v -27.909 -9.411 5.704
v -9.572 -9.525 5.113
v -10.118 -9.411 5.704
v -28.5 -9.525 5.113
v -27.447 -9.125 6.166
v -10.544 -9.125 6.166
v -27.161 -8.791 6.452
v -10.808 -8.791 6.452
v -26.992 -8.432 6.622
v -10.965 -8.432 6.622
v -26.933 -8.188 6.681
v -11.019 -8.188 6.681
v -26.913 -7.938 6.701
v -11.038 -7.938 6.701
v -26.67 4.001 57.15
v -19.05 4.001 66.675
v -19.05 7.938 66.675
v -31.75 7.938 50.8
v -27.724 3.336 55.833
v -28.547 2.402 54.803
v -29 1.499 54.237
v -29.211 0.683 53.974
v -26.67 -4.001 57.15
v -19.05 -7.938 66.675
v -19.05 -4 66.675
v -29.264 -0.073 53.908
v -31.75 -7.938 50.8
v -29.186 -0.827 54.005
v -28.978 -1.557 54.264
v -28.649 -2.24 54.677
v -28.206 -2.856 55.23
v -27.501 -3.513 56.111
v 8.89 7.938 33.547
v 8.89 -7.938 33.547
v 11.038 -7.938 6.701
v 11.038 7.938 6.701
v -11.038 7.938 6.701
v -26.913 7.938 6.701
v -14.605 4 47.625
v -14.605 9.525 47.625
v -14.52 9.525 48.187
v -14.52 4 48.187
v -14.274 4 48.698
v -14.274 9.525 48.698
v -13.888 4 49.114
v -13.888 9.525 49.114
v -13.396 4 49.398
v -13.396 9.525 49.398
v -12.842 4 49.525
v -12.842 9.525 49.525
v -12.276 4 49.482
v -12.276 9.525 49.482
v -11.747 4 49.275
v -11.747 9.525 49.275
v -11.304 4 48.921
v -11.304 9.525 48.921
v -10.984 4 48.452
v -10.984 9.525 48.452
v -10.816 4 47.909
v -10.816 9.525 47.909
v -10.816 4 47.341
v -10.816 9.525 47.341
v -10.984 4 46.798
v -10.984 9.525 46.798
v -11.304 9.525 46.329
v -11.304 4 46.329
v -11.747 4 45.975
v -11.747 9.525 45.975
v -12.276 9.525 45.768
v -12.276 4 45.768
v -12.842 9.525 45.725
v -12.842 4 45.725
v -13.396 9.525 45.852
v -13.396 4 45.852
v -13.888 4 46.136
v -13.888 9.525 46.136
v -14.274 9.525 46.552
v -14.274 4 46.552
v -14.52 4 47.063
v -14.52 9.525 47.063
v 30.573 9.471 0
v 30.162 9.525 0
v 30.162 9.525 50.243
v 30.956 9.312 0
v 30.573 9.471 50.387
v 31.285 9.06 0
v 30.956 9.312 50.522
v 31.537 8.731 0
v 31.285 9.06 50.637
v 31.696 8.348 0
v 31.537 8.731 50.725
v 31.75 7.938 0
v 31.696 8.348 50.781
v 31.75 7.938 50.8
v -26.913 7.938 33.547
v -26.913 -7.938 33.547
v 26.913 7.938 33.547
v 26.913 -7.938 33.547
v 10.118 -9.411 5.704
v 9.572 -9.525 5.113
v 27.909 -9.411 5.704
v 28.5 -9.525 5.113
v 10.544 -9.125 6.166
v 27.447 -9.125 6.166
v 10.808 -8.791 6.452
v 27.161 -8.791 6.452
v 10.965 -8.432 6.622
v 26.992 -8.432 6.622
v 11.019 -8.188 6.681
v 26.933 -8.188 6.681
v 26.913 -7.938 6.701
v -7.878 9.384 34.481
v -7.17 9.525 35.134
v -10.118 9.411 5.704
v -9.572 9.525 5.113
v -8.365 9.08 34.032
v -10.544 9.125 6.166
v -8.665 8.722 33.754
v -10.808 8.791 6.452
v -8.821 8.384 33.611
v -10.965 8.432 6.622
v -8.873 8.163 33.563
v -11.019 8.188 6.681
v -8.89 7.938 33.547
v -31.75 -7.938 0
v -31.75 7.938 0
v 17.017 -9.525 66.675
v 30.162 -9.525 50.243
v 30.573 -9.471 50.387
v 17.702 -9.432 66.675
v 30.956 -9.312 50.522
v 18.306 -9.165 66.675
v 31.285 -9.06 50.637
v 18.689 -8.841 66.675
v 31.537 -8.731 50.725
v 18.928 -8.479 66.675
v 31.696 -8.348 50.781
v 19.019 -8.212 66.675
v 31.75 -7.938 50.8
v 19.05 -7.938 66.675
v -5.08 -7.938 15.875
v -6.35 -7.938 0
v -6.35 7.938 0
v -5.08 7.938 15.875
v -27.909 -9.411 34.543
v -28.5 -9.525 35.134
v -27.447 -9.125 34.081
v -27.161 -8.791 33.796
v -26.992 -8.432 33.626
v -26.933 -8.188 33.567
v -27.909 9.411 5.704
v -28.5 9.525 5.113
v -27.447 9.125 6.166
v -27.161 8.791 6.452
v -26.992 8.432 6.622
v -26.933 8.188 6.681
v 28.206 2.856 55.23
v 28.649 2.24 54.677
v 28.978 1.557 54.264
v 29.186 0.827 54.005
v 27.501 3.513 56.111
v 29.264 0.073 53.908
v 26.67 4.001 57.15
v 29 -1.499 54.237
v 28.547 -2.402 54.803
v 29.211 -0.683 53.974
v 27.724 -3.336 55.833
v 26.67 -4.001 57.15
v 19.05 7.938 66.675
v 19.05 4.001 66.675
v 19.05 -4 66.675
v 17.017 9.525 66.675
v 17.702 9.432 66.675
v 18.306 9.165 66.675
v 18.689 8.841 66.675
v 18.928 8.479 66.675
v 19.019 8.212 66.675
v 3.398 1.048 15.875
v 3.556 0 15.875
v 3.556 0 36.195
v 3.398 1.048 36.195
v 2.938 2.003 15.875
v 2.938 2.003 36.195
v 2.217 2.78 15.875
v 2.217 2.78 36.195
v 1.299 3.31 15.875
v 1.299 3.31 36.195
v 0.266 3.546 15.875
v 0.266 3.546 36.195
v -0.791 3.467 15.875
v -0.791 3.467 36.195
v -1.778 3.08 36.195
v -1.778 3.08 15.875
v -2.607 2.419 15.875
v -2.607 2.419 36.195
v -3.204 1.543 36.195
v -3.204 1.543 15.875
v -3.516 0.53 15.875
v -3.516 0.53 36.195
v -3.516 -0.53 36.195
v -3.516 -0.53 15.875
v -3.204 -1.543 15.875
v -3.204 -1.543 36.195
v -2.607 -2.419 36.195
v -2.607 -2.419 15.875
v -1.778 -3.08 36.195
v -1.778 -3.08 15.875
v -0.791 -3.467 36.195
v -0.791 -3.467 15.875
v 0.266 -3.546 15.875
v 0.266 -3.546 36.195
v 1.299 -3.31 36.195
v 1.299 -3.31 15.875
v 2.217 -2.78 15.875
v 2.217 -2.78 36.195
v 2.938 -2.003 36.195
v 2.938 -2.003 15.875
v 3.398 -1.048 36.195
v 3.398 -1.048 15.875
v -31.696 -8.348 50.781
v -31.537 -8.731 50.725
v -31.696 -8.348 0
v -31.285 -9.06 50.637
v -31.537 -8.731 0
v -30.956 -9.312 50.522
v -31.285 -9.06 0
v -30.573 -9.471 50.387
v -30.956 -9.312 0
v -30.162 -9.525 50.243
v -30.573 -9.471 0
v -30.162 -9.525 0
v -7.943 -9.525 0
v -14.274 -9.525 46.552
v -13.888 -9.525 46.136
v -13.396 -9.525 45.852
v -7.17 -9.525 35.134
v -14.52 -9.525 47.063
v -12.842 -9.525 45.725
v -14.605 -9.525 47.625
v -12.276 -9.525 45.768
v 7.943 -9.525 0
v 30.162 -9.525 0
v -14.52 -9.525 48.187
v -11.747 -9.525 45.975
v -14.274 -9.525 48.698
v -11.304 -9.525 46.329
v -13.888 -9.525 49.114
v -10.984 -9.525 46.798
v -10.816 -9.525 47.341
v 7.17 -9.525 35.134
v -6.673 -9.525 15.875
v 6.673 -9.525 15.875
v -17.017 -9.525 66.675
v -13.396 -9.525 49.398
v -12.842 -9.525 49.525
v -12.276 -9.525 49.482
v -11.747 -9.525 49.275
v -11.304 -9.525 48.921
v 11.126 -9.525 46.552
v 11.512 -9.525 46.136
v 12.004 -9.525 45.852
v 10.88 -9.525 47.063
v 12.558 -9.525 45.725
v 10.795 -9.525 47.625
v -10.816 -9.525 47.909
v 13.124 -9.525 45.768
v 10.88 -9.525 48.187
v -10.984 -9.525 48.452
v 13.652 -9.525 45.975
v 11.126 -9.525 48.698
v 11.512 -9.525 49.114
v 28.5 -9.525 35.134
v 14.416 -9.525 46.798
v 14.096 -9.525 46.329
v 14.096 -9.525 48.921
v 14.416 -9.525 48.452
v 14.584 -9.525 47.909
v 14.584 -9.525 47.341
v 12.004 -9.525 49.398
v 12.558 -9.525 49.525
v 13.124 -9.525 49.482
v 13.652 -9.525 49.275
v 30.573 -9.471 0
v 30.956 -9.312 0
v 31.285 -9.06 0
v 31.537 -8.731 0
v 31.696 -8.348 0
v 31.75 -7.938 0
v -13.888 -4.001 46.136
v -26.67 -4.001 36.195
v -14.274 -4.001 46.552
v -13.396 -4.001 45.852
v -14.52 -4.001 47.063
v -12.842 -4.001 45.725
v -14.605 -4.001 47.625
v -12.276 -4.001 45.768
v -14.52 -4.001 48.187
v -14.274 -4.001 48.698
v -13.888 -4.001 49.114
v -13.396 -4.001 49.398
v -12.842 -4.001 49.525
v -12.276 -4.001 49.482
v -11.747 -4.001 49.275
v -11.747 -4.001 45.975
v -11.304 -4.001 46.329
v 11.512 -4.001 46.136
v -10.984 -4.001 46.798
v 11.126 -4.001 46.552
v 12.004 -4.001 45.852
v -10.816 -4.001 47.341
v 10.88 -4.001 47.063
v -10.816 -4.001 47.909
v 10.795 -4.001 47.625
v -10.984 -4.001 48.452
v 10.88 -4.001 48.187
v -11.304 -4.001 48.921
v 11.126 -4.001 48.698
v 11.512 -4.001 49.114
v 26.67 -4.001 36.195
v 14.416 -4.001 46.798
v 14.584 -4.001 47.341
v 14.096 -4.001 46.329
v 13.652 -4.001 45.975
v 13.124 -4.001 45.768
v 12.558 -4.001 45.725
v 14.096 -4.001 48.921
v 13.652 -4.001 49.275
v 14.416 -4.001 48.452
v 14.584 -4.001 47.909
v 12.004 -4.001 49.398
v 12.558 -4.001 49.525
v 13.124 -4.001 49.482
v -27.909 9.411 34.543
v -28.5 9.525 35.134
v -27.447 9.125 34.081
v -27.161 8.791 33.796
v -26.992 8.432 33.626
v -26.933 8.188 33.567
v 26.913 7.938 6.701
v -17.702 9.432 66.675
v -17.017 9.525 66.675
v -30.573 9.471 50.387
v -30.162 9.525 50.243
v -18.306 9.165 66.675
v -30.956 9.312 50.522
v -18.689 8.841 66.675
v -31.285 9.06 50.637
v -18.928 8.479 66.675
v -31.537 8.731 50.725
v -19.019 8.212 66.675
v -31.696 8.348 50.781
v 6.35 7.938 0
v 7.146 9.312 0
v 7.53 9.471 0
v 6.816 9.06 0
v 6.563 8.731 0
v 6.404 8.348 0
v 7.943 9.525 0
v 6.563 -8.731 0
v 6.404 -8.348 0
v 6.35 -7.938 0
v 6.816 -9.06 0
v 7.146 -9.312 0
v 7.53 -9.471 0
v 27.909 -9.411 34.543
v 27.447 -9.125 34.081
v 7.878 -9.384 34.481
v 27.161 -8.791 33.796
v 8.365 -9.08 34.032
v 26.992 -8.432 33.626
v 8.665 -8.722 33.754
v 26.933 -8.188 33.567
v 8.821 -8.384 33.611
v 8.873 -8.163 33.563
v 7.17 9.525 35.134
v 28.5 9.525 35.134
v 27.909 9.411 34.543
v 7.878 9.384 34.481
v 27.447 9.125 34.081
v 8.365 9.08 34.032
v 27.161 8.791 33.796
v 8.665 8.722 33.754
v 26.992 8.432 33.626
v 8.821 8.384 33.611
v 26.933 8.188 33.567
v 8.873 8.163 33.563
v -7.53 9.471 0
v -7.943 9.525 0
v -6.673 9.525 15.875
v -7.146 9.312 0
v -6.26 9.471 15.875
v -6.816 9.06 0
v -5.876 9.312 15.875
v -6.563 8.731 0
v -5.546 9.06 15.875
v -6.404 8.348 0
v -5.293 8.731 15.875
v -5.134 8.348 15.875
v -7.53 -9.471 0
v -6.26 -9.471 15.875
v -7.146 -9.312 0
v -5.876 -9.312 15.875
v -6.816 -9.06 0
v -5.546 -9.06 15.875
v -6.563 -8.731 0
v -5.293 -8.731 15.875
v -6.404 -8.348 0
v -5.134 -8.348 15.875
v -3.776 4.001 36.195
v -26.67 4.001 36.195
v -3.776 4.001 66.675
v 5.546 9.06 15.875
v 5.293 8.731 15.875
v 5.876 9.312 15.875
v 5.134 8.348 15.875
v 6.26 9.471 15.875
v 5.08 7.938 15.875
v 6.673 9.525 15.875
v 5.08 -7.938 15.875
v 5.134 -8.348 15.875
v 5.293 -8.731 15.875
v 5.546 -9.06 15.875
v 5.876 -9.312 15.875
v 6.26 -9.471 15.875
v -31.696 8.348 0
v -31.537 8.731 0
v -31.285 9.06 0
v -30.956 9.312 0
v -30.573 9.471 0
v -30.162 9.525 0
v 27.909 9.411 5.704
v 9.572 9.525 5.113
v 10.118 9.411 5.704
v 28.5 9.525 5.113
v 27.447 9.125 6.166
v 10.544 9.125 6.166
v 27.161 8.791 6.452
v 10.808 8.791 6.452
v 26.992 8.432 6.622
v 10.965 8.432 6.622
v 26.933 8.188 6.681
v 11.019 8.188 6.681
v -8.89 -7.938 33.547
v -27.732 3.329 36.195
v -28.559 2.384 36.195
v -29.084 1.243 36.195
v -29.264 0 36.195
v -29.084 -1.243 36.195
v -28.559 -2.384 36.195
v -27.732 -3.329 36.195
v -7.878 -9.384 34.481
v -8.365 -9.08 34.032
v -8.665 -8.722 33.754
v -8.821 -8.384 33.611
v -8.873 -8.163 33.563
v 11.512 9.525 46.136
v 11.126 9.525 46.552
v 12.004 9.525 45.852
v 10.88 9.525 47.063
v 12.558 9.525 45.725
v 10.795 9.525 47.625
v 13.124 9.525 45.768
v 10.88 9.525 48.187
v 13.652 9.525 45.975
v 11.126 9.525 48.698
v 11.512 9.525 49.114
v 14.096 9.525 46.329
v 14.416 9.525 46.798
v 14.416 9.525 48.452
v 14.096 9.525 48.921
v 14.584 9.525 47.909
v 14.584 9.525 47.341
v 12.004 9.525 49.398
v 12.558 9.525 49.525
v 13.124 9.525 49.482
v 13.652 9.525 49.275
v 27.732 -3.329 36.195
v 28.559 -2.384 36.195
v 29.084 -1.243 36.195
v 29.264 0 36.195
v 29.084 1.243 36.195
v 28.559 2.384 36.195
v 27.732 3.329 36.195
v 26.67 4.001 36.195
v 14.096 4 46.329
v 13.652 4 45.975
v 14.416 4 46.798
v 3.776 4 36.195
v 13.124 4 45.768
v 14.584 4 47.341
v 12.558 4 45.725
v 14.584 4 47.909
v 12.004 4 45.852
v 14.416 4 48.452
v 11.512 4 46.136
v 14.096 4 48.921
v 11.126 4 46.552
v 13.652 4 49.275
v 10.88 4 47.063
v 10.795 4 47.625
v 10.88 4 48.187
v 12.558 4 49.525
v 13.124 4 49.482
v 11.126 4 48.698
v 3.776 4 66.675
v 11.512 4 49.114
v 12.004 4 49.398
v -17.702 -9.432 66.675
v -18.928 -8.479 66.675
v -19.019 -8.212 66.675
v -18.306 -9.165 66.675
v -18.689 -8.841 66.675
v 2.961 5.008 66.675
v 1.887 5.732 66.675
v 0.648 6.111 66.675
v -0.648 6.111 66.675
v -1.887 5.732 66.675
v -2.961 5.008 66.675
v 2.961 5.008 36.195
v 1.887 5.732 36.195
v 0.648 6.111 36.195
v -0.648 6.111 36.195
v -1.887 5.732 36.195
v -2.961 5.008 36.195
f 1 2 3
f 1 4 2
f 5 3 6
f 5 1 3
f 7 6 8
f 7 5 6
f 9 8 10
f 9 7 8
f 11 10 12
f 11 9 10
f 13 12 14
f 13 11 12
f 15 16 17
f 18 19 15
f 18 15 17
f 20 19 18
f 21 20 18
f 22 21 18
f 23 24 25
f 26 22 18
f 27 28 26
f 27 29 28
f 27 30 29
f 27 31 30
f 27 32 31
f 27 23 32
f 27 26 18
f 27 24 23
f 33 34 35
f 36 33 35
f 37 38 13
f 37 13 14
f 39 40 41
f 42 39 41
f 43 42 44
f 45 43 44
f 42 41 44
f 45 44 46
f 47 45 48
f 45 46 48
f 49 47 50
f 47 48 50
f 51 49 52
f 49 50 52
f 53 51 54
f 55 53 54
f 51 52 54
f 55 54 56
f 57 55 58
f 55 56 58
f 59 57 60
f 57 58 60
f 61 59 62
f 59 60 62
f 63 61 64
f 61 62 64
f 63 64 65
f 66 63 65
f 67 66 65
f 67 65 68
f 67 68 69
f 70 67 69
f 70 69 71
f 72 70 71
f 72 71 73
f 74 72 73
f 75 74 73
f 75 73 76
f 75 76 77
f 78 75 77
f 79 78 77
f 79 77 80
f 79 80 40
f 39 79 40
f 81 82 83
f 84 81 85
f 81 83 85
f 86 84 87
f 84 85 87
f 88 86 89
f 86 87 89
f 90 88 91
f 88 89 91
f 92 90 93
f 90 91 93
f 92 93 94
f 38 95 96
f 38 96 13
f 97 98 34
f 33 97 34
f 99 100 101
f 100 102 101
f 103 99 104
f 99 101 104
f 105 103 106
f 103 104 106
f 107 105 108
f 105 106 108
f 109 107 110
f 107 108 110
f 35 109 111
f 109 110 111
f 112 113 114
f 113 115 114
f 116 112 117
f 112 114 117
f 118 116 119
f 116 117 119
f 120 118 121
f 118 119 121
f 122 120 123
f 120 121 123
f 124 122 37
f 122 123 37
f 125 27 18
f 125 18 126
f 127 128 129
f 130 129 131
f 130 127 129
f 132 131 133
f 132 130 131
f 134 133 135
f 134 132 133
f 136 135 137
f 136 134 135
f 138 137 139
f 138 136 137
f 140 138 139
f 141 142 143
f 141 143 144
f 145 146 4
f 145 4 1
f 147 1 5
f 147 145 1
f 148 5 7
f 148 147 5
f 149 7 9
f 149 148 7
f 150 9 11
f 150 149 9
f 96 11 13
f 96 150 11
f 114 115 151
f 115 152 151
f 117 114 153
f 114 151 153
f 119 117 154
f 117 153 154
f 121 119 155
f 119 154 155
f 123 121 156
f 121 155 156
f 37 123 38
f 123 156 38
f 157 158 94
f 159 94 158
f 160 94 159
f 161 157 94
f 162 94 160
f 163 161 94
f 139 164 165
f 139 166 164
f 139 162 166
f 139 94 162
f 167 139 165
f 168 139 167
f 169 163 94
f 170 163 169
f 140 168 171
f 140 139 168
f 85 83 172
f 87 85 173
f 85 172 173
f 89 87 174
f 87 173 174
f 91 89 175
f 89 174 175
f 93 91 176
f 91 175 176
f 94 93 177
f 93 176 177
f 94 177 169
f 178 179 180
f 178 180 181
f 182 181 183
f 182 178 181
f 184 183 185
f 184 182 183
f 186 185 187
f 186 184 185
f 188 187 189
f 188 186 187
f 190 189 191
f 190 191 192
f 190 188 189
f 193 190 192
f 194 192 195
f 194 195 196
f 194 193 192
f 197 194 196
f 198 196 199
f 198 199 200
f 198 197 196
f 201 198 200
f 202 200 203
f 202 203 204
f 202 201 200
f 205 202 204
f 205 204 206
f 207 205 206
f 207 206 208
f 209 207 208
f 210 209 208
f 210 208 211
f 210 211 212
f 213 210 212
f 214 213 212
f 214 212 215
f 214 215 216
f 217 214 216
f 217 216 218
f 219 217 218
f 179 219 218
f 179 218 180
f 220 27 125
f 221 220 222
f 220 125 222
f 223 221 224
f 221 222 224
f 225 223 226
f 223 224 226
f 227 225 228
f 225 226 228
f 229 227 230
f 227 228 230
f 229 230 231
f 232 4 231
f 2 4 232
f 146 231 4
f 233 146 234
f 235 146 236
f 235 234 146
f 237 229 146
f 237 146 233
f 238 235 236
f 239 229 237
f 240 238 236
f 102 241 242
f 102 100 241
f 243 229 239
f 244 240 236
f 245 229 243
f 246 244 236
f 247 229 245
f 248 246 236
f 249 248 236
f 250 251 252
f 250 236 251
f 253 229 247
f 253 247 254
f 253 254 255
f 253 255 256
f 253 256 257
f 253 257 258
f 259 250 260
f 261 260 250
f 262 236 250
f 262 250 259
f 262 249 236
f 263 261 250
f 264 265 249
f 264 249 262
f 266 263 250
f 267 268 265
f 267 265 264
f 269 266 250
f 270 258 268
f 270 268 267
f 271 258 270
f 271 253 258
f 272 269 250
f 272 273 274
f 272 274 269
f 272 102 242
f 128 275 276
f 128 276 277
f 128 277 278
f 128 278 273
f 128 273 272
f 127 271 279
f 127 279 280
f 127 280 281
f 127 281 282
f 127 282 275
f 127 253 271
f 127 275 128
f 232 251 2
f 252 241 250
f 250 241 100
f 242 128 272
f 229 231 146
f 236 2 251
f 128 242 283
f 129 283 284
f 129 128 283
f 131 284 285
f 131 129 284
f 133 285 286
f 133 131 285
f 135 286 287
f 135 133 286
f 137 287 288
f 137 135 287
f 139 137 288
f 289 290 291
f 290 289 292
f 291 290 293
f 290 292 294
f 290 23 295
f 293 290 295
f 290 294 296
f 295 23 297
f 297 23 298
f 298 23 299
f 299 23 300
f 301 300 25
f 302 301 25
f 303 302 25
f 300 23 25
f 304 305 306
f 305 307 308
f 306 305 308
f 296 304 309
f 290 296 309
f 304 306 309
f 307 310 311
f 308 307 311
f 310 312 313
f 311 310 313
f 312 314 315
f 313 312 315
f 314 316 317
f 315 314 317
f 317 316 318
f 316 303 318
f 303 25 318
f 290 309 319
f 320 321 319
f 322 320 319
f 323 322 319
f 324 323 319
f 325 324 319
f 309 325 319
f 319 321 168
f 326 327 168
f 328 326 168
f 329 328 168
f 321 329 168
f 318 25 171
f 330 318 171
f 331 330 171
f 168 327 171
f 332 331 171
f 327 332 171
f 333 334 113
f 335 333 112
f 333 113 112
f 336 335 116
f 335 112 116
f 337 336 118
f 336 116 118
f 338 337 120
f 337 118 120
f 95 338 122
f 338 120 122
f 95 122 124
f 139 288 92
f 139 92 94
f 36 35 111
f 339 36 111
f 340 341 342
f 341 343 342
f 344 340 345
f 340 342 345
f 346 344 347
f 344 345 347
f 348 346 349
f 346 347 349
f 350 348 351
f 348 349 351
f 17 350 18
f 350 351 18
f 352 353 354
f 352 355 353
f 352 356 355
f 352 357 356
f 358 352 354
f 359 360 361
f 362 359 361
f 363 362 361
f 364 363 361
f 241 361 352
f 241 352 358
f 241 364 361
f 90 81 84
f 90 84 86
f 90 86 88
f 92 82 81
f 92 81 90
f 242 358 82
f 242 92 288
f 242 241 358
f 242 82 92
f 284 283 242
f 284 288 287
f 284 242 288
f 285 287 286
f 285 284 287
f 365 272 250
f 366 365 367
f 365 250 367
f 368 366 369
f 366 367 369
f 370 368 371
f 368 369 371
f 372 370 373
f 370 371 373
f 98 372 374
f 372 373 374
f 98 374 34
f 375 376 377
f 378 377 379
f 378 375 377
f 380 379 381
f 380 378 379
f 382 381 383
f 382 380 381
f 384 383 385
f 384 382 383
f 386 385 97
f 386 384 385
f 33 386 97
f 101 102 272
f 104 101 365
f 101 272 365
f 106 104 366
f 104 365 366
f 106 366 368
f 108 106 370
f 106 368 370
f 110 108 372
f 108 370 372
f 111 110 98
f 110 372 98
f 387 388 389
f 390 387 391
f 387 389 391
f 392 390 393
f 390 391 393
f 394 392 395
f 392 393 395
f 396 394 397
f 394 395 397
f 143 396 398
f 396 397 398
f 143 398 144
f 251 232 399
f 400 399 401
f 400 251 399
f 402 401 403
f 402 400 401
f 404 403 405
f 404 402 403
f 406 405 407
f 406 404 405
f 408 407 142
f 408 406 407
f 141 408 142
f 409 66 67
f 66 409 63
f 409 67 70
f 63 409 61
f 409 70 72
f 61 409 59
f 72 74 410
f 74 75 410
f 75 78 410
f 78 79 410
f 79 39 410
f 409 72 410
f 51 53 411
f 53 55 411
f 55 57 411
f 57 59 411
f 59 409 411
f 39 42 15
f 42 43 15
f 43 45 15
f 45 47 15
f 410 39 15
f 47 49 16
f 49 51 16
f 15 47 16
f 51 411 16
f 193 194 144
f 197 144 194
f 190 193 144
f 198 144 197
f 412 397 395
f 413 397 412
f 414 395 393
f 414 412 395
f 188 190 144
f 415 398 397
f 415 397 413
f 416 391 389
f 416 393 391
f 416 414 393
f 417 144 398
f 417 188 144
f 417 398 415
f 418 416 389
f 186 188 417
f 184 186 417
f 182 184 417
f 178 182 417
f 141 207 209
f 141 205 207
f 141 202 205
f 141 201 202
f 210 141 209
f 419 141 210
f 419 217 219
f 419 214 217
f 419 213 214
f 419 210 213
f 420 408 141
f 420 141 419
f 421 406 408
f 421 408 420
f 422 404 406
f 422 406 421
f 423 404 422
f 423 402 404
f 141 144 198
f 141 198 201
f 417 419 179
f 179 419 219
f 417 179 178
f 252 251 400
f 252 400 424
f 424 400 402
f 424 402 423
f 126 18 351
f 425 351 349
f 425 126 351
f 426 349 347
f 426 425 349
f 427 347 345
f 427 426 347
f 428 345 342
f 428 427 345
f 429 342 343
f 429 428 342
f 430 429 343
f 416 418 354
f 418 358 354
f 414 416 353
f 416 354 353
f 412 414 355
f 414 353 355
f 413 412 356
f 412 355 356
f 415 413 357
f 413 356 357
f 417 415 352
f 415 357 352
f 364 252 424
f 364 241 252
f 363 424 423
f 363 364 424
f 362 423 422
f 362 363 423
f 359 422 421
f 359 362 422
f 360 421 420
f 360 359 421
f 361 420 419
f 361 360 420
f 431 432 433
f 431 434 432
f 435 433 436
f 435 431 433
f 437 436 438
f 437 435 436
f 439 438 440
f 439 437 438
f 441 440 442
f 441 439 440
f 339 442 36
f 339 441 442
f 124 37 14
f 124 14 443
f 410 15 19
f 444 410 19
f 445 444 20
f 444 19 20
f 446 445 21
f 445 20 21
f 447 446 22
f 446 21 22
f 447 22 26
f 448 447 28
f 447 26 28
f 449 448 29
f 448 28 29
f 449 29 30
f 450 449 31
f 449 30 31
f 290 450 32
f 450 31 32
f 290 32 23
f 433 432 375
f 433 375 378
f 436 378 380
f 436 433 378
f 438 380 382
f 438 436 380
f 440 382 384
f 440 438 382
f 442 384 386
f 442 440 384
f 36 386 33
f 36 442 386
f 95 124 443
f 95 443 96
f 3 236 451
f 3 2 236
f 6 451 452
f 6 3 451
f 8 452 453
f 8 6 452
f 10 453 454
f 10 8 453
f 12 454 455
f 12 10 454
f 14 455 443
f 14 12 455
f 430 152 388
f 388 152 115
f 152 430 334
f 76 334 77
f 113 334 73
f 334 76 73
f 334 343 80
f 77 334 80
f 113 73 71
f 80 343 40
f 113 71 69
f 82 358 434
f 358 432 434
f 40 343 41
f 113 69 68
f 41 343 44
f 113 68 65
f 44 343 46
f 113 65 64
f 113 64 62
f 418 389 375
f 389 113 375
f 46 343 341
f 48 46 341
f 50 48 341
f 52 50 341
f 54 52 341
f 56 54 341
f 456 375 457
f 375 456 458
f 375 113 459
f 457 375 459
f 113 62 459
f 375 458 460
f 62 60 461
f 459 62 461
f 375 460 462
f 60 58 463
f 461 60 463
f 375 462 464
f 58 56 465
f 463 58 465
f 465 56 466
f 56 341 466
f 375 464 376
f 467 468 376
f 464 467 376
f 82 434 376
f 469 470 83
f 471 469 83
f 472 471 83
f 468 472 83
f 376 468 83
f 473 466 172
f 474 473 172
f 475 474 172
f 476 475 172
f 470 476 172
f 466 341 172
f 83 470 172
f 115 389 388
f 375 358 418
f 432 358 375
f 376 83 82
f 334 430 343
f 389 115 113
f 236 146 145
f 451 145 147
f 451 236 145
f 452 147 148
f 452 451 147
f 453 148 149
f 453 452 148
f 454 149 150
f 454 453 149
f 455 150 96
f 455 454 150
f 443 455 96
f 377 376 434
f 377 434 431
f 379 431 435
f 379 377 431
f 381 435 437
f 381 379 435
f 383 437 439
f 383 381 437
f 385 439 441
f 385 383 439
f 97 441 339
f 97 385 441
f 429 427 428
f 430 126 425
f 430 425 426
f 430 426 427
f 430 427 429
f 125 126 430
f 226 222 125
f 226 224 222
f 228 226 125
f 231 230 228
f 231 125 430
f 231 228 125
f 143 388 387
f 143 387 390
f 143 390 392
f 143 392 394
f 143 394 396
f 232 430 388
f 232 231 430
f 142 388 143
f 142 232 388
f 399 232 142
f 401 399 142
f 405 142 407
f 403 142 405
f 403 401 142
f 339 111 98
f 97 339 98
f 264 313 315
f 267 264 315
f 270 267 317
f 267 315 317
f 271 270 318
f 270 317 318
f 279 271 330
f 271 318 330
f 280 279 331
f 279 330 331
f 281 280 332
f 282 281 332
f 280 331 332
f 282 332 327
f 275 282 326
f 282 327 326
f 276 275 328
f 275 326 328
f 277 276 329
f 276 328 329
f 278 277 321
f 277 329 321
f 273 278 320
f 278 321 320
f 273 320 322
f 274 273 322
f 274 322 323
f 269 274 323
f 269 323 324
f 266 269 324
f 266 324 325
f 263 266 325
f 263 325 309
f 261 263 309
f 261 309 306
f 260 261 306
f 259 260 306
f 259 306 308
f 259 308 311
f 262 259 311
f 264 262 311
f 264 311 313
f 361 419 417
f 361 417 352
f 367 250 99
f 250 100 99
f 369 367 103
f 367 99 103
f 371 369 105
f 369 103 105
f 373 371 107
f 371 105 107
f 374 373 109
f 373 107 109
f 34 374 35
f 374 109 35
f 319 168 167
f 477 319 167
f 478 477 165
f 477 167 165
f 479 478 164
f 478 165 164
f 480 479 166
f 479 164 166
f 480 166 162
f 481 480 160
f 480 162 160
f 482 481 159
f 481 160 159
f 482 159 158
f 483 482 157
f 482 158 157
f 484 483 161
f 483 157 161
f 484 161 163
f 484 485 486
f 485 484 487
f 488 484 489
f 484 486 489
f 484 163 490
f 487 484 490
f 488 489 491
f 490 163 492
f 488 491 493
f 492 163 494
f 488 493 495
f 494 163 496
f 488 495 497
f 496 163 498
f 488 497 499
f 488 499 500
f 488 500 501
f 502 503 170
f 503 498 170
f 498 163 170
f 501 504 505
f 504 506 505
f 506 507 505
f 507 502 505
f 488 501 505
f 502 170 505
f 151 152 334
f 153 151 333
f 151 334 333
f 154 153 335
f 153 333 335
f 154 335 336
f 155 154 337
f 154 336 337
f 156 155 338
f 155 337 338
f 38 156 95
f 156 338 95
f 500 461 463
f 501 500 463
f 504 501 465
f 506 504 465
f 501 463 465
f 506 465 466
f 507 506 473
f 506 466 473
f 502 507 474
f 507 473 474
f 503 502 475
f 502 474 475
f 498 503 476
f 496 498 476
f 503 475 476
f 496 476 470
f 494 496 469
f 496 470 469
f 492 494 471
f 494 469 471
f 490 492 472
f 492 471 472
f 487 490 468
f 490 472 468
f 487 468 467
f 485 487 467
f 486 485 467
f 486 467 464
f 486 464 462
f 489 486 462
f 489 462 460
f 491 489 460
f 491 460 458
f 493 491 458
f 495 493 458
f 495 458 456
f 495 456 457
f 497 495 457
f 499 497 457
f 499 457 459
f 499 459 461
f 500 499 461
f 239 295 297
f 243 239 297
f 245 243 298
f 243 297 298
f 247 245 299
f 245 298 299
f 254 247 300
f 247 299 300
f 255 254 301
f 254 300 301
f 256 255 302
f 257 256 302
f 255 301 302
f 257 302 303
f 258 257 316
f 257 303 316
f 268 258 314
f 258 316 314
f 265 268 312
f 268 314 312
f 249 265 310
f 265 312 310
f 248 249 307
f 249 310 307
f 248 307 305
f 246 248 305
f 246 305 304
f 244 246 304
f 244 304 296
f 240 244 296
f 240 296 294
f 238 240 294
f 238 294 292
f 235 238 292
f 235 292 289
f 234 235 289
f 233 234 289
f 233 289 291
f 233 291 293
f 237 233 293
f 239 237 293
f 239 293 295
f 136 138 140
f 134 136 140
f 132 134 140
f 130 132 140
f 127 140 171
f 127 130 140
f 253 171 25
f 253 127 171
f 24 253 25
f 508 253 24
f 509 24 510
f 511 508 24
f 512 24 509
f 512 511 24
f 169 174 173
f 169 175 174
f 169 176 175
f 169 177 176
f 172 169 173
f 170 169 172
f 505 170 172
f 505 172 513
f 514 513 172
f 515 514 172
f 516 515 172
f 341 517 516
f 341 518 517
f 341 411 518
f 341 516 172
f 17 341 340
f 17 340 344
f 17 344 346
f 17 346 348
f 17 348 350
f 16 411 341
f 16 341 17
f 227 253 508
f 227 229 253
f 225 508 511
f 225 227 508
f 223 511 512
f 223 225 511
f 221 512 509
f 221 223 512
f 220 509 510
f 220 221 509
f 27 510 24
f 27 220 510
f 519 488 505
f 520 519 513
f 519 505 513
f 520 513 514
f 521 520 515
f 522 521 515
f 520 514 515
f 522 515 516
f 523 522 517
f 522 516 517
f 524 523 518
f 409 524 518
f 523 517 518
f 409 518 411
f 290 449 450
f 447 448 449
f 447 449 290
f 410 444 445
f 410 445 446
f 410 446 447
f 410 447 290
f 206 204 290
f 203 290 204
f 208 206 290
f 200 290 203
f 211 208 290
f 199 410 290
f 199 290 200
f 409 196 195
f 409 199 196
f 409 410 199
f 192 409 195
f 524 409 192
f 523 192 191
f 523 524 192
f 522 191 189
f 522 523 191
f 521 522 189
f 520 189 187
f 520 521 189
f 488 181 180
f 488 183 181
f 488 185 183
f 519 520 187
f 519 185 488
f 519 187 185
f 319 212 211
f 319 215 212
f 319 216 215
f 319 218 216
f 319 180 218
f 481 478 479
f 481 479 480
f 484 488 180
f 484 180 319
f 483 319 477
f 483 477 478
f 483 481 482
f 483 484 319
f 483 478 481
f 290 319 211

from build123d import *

# Parameters (mm, degrees)
F1_DEPTH  = 9.525
F3_DEPTH  = 30.48
F4_R      = 3.556
F5_DEPTH  = 36.195
F7_DEPTH  = 12.7
F8_R      = 1.5875
F9_R      = 1.905
F10_DEPTH = 19.05


# Not quite as in the source:
# - a feature names something its author has since deleted; it is built from what else it names


with BuildPart() as f1:
    # F0 (on Front) → F1 (new body, symmetric)
    with BuildSketch(Plane.XZ):
        Polygon((-31.75, 50.8), (-31.75, 0), (-6.35, 0), (-5.08, 15.875), (0, 15.875), (0, 66.675), (-19.05, 66.675), align=None)
        Polygon((19.05, 66.675), (0, 66.675), (0, 15.875), (5.08, 15.875), (6.35, 0), (31.75, 0), (31.75, 50.8), align=None)
    extrude(amount=F1_DEPTH, both=True)

    # F2 (on face) → F3 (cut)
    with BuildSketch(Plane.XY.offset(66.675)):
        with BuildLine():
            Line((26.67, -4.0005), (26.67, 4.0005))
            Line((26.67, 4.0005), (3.7759814618, 4.0005))
            ThreePointArc((3.7759814618, 4.0005), (0, 6.1595), (-3.7759814618, 4.0005))
            Line((-3.7759814618, 4.0005), (-26.67, 4.0005))
            Line((-26.67, 4.0005), (-26.67, -4.0005))
            Line((-26.67, -4.0005), (26.67, -4.0005))
        make_face()
        with BuildLine():
            ThreePointArc((26.67, -4.0005), (29.2644515955, 0), (26.67, 4.0005))
            Line((26.67, 4.0005), (26.67, -4.0005))
        make_face()
        with BuildLine():
            ThreePointArc((-26.67, 4.0005), (-29.2644515955, 0), (-26.67, -4.0005))
            Line((-26.67, -4.0005), (-26.67, 4.0005))
        make_face()
    extrude(amount=-F3_DEPTH, mode=Mode.SUBTRACT)

    # F4 (on Top) → F5 (cut, through all)
    with BuildSketch(Plane.XY):
        Circle(F4_R)
    extrude(amount=F5_DEPTH, mode=Mode.SUBTRACT)

    # F6 (on Front) → F7 (cut, symmetric)
    with BuildSketch(Plane.XZ):
        Polygon((-8.89, 33.5468458159), (-26.9126990667, 33.5468458159), (-26.9126990667, 6.7006074823), (-11.0376990667, 6.7006074823), align=None)
        Polygon((8.89, 33.5468458159), (11.0376990667, 6.7006074823), (26.9126990667, 6.7006074823), (26.9126990667, 33.5468458159), align=None)
    extrude(amount=F7_DEPTH, both=True, mode=Mode.SUBTRACT)

    # F8
    f8_edges = [f1.edges().sort_by_distance(p)[0] for p in [
        (31.75, 9.525, 25.4),
        (25.4, 9.525, 58.7375),
        (31.75, -9.525, 25.4),
        (25.4, -9.525, 58.7375),
        (5.715, 9.525, 7.9375),
        (5.715, -9.525, 7.9375),
        (-5.715, -9.525, 7.9375),
        (-5.715, 9.525, 7.9375),
        (-31.75, 9.525, 25.4),
        (-31.75, -9.525, 25.4),
        (-25.4, 9.525, 58.7375),
        (-25.4, -9.525, 58.7375),
        (-17.90135, 9.525, 33.546846),
        (-26.912699, 9.525, 20.123727),
        (-18.975199, 9.525, 6.700607),
        (-9.96385, 9.525, 20.123727),
        (9.96385, 9.525, 20.123727),
        (18.975199, 9.525, 6.700607),
        (26.912699, 9.525, 20.123727),
        (17.90135, 9.525, 33.546846),
        (-17.90135, -9.525, 33.546846),
        (-26.912699, -9.525, 20.123727),
        (-18.975199, -9.525, 6.700607),
        (-9.96385, -9.525, 20.123727),
        (9.96385, -9.525, 20.123727),
        (18.975199, -9.525, 6.700607),
        (26.912699, -9.525, 20.123727),
        (17.90135, -9.525, 33.546846),
    ]]
    fillet(f8_edges, radius=F8_R)

    # F9 (on face) → F10 (cut, through all)
    with BuildSketch(Plane(origin=(0, 9.525, 0), x_dir=(-1, 0, 0), z_dir=(0, 1, 0))):
        with Locations((-12.7, 47.625)):
            Circle(F9_R)
        with Locations((12.7, 47.625)):
            Circle(F9_R)
    extrude(amount=-F10_DEPTH, mode=Mode.SUBTRACT)


solid = f1.part
